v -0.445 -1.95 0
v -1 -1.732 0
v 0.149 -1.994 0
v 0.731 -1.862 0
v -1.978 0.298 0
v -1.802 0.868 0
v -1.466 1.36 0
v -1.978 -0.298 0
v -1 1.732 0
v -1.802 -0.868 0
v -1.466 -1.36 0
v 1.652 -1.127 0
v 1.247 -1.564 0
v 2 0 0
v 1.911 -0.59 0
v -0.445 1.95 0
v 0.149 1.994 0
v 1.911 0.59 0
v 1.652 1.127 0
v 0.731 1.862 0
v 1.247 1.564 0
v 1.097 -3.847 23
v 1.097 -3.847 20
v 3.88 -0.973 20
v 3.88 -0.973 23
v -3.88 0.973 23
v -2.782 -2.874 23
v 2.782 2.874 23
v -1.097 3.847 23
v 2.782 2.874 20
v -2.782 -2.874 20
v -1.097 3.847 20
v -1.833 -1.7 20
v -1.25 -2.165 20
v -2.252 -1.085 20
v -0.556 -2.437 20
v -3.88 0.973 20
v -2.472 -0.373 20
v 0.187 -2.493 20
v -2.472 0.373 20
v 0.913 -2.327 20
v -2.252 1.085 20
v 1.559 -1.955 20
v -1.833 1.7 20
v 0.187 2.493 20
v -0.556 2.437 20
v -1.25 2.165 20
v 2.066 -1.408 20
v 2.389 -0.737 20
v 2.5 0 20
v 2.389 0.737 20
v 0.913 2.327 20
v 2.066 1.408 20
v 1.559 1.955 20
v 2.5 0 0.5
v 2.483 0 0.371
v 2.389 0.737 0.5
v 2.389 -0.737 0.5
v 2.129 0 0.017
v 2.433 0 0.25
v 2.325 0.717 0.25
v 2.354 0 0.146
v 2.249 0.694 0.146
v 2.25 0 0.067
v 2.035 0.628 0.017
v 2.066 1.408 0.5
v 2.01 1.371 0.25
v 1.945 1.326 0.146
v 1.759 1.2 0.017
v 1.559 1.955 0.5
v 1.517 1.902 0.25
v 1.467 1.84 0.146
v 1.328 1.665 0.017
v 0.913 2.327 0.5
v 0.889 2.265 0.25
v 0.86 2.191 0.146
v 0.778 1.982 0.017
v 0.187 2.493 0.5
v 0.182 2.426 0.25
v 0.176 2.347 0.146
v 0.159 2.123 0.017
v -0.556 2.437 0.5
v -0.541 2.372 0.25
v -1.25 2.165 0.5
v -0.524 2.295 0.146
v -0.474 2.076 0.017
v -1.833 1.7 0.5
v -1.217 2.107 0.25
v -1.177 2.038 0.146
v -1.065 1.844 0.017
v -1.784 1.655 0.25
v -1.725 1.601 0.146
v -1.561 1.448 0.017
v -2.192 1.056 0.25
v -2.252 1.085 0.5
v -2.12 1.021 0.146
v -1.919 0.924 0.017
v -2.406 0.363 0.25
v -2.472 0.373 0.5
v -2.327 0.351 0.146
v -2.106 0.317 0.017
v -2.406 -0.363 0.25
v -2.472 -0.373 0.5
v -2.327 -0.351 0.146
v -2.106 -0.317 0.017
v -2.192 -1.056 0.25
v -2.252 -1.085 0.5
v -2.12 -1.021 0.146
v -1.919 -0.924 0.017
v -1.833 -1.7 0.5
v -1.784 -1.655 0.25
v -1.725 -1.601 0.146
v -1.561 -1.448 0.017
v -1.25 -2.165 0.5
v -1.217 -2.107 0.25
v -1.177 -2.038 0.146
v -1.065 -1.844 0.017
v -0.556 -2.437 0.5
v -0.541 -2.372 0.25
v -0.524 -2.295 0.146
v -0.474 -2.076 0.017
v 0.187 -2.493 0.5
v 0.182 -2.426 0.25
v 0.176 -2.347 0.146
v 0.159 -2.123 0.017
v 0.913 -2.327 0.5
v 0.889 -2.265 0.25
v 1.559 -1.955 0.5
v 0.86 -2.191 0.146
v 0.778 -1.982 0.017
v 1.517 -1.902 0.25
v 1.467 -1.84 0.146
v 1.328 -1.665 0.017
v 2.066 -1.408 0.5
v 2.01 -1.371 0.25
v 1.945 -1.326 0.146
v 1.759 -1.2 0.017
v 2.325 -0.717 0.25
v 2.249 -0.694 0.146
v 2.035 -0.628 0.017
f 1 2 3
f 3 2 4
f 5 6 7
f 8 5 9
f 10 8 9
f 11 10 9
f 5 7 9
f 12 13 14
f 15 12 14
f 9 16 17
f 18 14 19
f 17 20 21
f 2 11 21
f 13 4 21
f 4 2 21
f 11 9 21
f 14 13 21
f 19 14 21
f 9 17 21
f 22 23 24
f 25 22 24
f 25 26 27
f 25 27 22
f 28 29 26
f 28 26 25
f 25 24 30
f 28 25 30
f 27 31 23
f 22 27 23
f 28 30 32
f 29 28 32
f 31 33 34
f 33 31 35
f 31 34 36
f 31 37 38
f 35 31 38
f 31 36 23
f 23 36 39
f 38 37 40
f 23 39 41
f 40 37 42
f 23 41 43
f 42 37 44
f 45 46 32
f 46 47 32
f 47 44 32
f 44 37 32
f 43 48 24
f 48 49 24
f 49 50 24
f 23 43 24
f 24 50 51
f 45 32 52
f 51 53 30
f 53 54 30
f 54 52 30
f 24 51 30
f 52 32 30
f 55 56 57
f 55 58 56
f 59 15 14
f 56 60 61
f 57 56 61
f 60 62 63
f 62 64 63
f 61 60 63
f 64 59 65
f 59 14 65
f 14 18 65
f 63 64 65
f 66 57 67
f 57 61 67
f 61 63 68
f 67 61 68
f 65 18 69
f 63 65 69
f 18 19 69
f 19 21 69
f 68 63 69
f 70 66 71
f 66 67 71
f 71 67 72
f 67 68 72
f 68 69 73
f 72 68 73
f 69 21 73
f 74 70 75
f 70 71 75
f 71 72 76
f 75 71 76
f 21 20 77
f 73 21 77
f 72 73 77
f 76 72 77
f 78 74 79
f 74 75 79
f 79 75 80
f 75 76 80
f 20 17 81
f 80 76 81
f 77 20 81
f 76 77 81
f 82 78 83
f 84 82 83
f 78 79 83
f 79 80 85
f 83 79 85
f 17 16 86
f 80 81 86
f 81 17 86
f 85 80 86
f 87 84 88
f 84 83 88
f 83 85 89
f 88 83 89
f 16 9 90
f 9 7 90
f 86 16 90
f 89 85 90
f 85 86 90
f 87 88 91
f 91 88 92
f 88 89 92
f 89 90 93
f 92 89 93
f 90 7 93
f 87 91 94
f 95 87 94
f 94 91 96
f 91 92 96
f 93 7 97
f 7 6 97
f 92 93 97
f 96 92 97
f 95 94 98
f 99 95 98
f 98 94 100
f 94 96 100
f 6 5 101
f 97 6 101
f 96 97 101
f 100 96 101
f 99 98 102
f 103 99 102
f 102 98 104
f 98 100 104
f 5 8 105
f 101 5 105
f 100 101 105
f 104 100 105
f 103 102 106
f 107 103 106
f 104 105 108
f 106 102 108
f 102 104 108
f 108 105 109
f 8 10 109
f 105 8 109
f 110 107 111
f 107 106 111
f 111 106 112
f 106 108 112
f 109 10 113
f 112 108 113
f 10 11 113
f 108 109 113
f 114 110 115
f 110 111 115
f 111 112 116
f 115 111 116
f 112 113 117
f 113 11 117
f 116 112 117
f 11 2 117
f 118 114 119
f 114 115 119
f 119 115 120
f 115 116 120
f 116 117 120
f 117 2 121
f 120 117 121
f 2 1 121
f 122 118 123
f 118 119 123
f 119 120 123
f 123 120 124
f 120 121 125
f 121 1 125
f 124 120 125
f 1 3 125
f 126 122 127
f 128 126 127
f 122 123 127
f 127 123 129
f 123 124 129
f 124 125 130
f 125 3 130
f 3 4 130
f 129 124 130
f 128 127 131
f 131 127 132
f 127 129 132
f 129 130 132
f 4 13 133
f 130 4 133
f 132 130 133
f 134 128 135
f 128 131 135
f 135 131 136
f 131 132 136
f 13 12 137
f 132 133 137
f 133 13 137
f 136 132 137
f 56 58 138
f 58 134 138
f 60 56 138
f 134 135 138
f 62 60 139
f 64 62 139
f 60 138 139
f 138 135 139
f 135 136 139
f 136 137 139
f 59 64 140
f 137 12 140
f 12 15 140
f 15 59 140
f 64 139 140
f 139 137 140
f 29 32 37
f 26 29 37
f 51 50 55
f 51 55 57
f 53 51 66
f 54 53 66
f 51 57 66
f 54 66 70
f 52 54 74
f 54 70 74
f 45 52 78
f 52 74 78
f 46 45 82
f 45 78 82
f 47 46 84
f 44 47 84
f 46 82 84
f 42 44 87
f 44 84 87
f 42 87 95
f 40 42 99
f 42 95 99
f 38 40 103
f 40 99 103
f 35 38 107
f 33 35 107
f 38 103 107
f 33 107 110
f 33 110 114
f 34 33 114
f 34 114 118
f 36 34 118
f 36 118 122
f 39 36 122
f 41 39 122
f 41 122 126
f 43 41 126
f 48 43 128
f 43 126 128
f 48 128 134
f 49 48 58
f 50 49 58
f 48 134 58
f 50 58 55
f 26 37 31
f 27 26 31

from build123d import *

# Parameters (mm, degrees)
SKETCH1_R           = 2.5
BOSS_EXTRUDE1_DEPTH = 20
BOSS_EXTRUDE2_DEPTH = 3
FILLET1_R           = 0.5


with BuildPart() as part:
    # Sketch1 → Boss-Extrude1 (new body)
    with BuildSketch(Plane.XY):
        Circle(SKETCH1_R)
    extrude(amount=BOSS_EXTRUDE1_DEPTH)

    # Sketch3 → Boss-Extrude2 (add)
    with BuildSketch(Plane.XY.offset(20)):
        Polygon((2.782434511, 2.873683732), (-1.097465859, 3.846500837), (-3.87990037, 0.972817104), (-2.782434511, -2.873683732), (1.097465859, -3.846500837), (3.87990037, -0.972817104), align=None)
    extrude(amount=BOSS_EXTRUDE2_DEPTH)

    # Fillet1
    fillet1_edges = [part.edges().sort_by_distance(p)[0] for p in [
        (-2.5, 0, 0),
    ]]
    fillet(fillet1_edges, radius=FILLET1_R)


solid = part.part
